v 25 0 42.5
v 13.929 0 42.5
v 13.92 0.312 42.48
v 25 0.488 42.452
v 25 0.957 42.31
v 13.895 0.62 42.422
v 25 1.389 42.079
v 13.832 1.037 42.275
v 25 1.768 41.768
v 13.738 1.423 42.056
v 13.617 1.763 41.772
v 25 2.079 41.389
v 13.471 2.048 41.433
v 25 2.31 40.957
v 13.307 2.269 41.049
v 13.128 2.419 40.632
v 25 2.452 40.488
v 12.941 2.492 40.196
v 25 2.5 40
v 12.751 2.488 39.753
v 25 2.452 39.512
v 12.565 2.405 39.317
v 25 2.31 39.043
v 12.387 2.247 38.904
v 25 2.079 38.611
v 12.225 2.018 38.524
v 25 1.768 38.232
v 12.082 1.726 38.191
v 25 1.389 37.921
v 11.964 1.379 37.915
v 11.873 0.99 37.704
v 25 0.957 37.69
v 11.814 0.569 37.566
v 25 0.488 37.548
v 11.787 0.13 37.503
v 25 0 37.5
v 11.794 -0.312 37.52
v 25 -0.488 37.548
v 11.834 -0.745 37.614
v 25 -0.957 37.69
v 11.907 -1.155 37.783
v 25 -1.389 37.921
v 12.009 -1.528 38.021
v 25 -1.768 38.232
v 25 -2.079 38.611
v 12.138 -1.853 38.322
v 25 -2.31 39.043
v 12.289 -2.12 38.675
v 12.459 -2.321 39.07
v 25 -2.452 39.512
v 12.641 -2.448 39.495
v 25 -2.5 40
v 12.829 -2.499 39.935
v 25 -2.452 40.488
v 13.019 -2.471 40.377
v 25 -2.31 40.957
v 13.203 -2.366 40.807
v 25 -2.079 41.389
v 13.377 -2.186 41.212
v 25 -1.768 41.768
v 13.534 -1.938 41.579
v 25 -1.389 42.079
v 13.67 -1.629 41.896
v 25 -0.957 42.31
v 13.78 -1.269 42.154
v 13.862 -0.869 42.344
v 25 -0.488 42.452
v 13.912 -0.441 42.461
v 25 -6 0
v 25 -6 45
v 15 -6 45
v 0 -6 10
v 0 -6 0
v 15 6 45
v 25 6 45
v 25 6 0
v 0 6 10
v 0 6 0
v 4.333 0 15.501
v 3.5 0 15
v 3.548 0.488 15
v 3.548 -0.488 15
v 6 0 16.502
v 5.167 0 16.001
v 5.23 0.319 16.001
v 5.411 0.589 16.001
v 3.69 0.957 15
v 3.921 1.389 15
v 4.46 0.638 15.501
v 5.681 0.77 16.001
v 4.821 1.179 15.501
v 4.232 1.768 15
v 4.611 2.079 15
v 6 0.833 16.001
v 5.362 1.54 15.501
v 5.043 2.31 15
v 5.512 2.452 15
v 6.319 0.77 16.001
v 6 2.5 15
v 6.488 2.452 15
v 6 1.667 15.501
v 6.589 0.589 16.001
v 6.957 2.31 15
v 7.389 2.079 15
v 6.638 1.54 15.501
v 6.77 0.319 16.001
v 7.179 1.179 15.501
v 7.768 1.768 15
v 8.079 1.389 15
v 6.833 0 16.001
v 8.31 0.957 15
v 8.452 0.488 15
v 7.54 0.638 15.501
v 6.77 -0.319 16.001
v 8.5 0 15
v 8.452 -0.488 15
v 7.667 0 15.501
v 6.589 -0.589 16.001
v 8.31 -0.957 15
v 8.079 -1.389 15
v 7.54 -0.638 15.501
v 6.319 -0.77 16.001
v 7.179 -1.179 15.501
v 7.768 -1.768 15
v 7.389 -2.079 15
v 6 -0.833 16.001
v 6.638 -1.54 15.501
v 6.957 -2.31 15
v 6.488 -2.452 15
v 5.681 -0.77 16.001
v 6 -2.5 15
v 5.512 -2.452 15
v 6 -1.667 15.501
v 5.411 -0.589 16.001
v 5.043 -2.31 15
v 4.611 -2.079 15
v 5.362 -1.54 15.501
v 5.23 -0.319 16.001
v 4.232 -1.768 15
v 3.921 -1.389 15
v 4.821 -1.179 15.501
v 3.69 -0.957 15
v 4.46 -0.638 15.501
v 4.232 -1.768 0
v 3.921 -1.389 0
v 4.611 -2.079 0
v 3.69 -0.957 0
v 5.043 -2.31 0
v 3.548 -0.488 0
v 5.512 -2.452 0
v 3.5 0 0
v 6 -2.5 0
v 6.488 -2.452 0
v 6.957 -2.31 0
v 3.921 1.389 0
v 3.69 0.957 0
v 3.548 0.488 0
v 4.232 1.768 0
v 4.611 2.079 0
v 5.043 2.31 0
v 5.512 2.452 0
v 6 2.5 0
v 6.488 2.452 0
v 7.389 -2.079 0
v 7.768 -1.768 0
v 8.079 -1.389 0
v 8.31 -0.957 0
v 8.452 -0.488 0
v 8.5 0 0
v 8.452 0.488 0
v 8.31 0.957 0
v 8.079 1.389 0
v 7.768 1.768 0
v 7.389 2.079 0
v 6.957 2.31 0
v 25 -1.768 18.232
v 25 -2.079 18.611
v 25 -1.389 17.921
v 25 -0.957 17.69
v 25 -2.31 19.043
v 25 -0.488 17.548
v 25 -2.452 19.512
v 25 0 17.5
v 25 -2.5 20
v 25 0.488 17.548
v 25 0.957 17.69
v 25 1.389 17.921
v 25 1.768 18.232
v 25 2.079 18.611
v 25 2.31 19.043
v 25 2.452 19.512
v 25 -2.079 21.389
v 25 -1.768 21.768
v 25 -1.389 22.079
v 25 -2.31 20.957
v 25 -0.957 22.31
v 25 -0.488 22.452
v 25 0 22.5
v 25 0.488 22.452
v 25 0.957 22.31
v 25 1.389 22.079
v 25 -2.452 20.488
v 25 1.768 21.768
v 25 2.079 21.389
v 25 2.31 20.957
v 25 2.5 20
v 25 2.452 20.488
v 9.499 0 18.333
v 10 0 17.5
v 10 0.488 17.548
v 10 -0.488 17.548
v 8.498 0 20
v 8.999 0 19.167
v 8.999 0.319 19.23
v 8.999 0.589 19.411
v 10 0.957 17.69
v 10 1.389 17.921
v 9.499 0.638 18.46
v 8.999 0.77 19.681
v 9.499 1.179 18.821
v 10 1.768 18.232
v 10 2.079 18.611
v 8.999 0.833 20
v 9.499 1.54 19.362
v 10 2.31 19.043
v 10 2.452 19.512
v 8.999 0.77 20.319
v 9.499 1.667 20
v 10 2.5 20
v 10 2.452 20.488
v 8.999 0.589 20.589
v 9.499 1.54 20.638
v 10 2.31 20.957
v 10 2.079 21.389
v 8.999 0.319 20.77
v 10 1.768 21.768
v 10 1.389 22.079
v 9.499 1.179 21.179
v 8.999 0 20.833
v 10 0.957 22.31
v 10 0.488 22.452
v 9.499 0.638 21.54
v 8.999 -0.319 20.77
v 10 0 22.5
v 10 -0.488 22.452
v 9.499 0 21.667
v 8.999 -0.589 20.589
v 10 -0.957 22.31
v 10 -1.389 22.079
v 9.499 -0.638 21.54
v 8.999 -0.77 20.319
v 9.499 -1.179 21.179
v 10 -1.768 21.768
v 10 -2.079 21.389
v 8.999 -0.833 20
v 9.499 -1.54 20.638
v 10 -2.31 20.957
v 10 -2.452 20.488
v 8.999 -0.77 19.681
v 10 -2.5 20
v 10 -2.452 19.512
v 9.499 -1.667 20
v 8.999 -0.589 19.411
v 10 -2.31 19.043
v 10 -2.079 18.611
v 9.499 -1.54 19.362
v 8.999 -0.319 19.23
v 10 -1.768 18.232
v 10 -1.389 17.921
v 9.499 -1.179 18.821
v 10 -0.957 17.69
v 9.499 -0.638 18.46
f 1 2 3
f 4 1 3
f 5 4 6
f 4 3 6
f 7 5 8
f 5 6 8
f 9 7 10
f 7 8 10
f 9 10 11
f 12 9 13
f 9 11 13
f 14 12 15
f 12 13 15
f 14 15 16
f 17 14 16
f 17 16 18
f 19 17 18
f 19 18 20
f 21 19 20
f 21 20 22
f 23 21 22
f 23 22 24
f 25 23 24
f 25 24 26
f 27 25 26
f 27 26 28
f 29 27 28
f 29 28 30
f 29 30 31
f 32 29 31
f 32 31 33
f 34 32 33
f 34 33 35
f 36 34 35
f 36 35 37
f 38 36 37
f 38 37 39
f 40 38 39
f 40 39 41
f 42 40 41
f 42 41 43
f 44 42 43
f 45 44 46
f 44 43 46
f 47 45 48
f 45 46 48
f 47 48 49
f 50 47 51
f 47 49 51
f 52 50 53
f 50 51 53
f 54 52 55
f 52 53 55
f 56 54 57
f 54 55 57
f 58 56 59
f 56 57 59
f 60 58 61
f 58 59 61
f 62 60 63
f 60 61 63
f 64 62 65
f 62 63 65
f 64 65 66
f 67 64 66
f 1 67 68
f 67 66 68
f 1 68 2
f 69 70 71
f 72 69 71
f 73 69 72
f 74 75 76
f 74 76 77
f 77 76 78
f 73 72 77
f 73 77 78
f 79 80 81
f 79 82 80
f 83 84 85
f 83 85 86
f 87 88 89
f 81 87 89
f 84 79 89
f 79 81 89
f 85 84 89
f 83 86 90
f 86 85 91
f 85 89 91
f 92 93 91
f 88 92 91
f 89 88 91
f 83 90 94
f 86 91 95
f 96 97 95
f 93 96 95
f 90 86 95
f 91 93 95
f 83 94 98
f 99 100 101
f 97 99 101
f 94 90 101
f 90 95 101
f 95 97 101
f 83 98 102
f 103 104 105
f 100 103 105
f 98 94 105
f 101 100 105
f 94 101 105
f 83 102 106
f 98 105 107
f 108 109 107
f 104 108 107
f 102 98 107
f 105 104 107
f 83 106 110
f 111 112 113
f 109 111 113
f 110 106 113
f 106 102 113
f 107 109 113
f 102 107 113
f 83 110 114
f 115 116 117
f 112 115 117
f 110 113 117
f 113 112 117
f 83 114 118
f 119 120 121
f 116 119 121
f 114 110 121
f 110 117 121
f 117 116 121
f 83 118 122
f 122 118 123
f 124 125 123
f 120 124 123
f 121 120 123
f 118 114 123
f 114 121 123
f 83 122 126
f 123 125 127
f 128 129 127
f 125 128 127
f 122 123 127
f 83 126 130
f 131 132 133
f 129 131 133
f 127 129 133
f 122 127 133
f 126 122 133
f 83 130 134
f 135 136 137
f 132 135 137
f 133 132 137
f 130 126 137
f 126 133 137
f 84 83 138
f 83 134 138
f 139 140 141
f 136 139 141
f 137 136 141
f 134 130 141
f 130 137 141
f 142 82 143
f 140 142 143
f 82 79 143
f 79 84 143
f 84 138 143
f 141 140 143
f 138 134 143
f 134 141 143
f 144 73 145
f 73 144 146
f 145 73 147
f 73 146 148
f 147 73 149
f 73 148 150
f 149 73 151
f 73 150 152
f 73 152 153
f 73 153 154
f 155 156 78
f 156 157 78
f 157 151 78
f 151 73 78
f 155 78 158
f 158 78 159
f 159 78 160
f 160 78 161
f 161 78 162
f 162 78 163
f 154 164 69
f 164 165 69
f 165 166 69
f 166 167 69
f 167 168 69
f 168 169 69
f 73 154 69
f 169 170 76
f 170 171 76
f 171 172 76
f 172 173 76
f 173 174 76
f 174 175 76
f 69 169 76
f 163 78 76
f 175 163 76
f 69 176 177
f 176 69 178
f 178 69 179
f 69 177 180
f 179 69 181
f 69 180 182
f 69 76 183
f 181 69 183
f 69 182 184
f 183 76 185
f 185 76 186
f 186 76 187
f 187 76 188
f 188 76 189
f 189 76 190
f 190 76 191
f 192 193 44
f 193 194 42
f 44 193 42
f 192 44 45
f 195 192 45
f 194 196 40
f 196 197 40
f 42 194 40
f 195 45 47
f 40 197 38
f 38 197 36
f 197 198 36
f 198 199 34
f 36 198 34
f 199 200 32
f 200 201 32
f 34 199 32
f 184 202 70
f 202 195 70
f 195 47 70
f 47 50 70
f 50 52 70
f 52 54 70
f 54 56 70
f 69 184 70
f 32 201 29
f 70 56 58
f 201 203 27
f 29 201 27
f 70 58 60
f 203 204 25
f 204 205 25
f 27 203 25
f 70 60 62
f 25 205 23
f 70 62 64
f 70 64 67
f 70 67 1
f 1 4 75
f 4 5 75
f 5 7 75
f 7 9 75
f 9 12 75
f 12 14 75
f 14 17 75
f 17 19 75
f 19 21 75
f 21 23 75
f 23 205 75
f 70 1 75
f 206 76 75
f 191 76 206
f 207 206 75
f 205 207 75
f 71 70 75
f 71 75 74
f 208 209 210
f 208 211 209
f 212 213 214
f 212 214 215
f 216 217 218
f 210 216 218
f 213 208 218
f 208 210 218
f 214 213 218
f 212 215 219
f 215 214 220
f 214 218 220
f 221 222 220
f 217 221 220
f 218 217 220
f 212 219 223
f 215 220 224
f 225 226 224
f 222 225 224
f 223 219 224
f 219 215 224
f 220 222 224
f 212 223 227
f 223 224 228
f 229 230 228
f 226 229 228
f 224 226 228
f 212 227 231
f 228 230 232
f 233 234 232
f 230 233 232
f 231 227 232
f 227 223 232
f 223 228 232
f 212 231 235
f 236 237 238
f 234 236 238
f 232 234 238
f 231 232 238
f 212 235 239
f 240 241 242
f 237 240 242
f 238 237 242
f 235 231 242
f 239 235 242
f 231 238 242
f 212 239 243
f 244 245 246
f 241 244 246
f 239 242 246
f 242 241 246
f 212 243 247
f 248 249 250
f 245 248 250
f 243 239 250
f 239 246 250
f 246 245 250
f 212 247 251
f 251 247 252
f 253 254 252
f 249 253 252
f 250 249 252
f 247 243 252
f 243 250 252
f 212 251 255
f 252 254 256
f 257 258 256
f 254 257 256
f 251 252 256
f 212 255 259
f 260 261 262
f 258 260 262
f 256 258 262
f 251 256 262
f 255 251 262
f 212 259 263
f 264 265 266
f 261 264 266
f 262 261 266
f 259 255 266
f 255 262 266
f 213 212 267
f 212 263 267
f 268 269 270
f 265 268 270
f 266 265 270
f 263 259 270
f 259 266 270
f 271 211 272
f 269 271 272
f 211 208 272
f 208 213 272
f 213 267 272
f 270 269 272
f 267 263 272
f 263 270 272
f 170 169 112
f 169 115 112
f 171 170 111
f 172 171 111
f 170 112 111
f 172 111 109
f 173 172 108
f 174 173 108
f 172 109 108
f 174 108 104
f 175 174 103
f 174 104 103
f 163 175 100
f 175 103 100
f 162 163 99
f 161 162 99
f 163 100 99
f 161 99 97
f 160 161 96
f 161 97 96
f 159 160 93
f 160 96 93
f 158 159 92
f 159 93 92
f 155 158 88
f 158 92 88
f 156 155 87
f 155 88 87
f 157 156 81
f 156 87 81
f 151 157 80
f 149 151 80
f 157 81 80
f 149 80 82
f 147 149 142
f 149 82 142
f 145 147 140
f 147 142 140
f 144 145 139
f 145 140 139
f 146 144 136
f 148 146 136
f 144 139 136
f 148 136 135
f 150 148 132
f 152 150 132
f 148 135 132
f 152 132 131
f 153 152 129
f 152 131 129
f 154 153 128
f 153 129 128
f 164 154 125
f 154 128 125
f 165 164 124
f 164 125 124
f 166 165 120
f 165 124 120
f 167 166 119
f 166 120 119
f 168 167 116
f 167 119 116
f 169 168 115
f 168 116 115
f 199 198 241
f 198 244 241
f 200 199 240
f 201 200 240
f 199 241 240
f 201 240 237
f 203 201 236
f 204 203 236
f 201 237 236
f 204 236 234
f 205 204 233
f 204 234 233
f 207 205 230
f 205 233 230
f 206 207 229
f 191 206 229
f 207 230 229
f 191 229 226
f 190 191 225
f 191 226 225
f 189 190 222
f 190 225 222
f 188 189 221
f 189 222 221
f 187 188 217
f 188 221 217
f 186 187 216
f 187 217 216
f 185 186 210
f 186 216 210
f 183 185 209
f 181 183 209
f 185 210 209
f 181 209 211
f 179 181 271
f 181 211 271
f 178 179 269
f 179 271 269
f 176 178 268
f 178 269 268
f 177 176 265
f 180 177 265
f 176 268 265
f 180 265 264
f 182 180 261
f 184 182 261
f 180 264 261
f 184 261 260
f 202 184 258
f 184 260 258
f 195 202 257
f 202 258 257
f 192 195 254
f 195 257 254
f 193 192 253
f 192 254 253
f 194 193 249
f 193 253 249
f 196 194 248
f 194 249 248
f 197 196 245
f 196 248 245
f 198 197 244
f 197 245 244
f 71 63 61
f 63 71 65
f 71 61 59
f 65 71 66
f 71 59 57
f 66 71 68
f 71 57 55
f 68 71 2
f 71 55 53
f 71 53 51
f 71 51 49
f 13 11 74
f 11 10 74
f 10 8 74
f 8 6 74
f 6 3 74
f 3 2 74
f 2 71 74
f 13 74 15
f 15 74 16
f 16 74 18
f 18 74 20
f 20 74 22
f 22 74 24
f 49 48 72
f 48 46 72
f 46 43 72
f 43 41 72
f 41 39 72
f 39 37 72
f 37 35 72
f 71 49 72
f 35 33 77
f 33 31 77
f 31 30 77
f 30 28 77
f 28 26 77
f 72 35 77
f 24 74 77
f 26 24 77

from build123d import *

# Parameters (mm, degrees)
EXTRUDE_1_DEPTH        = 6
HOLE_WIZARD_M6_2_D     = 5
HOLE_WIZARD_M6_2_DEPTH = 15
HOLE_WIZARD_M6_2_TIP   = 1.502151548
HOLE_WIZARD_M6_1_D     = 5
HOLE_WIZARD_M6_1_DEPTH = 15
HOLE_WIZARD_M6_1_TIP   = 1.502151548


with BuildPart() as part:
    # 草图1 → 凸台-拉伸1 (new, symmetric)
    with BuildSketch(Plane(origin=(0, 0, 0), x_dir=(1, 0, 0), z_dir=(0, 1, 0))):
        Polygon((0, 0), (25, 0), (25, -45), (15, -45), (0, -10), align=None)
    extrude(amount=EXTRUDE_1_DEPTH, both=True)

    # M6 螺纹孔2
    with Locations(Plane(origin=(25, 0, 0), x_dir=(0, 0, -1), z_dir=(1, 0, 0))):
        with Locations((-20, 0), (-40, 0)):
            Hole(HOLE_WIZARD_M6_2_D / 2, depth=HOLE_WIZARD_M6_2_DEPTH)
            with Locations((0, 0, -(HOLE_WIZARD_M6_2_DEPTH + HOLE_WIZARD_M6_2_TIP / 2))):  # 118° drill point
                Cone(0, HOLE_WIZARD_M6_2_D / 2, HOLE_WIZARD_M6_2_TIP, mode=Mode.SUBTRACT)

    # M6 螺纹孔1
    with Locations(Plane(origin=(0, 0, 0), x_dir=(-1, 0, 0), z_dir=(0, 0, -1))):
        with Locations((-6, 0)):
            Hole(HOLE_WIZARD_M6_1_D / 2, depth=HOLE_WIZARD_M6_1_DEPTH)
            with Locations((0, 0, -(HOLE_WIZARD_M6_1_DEPTH + HOLE_WIZARD_M6_1_TIP / 2))):  # 118° drill point
                Cone(0, HOLE_WIZARD_M6_1_D / 2, HOLE_WIZARD_M6_1_TIP, mode=Mode.SUBTRACT)


solid = part.part
